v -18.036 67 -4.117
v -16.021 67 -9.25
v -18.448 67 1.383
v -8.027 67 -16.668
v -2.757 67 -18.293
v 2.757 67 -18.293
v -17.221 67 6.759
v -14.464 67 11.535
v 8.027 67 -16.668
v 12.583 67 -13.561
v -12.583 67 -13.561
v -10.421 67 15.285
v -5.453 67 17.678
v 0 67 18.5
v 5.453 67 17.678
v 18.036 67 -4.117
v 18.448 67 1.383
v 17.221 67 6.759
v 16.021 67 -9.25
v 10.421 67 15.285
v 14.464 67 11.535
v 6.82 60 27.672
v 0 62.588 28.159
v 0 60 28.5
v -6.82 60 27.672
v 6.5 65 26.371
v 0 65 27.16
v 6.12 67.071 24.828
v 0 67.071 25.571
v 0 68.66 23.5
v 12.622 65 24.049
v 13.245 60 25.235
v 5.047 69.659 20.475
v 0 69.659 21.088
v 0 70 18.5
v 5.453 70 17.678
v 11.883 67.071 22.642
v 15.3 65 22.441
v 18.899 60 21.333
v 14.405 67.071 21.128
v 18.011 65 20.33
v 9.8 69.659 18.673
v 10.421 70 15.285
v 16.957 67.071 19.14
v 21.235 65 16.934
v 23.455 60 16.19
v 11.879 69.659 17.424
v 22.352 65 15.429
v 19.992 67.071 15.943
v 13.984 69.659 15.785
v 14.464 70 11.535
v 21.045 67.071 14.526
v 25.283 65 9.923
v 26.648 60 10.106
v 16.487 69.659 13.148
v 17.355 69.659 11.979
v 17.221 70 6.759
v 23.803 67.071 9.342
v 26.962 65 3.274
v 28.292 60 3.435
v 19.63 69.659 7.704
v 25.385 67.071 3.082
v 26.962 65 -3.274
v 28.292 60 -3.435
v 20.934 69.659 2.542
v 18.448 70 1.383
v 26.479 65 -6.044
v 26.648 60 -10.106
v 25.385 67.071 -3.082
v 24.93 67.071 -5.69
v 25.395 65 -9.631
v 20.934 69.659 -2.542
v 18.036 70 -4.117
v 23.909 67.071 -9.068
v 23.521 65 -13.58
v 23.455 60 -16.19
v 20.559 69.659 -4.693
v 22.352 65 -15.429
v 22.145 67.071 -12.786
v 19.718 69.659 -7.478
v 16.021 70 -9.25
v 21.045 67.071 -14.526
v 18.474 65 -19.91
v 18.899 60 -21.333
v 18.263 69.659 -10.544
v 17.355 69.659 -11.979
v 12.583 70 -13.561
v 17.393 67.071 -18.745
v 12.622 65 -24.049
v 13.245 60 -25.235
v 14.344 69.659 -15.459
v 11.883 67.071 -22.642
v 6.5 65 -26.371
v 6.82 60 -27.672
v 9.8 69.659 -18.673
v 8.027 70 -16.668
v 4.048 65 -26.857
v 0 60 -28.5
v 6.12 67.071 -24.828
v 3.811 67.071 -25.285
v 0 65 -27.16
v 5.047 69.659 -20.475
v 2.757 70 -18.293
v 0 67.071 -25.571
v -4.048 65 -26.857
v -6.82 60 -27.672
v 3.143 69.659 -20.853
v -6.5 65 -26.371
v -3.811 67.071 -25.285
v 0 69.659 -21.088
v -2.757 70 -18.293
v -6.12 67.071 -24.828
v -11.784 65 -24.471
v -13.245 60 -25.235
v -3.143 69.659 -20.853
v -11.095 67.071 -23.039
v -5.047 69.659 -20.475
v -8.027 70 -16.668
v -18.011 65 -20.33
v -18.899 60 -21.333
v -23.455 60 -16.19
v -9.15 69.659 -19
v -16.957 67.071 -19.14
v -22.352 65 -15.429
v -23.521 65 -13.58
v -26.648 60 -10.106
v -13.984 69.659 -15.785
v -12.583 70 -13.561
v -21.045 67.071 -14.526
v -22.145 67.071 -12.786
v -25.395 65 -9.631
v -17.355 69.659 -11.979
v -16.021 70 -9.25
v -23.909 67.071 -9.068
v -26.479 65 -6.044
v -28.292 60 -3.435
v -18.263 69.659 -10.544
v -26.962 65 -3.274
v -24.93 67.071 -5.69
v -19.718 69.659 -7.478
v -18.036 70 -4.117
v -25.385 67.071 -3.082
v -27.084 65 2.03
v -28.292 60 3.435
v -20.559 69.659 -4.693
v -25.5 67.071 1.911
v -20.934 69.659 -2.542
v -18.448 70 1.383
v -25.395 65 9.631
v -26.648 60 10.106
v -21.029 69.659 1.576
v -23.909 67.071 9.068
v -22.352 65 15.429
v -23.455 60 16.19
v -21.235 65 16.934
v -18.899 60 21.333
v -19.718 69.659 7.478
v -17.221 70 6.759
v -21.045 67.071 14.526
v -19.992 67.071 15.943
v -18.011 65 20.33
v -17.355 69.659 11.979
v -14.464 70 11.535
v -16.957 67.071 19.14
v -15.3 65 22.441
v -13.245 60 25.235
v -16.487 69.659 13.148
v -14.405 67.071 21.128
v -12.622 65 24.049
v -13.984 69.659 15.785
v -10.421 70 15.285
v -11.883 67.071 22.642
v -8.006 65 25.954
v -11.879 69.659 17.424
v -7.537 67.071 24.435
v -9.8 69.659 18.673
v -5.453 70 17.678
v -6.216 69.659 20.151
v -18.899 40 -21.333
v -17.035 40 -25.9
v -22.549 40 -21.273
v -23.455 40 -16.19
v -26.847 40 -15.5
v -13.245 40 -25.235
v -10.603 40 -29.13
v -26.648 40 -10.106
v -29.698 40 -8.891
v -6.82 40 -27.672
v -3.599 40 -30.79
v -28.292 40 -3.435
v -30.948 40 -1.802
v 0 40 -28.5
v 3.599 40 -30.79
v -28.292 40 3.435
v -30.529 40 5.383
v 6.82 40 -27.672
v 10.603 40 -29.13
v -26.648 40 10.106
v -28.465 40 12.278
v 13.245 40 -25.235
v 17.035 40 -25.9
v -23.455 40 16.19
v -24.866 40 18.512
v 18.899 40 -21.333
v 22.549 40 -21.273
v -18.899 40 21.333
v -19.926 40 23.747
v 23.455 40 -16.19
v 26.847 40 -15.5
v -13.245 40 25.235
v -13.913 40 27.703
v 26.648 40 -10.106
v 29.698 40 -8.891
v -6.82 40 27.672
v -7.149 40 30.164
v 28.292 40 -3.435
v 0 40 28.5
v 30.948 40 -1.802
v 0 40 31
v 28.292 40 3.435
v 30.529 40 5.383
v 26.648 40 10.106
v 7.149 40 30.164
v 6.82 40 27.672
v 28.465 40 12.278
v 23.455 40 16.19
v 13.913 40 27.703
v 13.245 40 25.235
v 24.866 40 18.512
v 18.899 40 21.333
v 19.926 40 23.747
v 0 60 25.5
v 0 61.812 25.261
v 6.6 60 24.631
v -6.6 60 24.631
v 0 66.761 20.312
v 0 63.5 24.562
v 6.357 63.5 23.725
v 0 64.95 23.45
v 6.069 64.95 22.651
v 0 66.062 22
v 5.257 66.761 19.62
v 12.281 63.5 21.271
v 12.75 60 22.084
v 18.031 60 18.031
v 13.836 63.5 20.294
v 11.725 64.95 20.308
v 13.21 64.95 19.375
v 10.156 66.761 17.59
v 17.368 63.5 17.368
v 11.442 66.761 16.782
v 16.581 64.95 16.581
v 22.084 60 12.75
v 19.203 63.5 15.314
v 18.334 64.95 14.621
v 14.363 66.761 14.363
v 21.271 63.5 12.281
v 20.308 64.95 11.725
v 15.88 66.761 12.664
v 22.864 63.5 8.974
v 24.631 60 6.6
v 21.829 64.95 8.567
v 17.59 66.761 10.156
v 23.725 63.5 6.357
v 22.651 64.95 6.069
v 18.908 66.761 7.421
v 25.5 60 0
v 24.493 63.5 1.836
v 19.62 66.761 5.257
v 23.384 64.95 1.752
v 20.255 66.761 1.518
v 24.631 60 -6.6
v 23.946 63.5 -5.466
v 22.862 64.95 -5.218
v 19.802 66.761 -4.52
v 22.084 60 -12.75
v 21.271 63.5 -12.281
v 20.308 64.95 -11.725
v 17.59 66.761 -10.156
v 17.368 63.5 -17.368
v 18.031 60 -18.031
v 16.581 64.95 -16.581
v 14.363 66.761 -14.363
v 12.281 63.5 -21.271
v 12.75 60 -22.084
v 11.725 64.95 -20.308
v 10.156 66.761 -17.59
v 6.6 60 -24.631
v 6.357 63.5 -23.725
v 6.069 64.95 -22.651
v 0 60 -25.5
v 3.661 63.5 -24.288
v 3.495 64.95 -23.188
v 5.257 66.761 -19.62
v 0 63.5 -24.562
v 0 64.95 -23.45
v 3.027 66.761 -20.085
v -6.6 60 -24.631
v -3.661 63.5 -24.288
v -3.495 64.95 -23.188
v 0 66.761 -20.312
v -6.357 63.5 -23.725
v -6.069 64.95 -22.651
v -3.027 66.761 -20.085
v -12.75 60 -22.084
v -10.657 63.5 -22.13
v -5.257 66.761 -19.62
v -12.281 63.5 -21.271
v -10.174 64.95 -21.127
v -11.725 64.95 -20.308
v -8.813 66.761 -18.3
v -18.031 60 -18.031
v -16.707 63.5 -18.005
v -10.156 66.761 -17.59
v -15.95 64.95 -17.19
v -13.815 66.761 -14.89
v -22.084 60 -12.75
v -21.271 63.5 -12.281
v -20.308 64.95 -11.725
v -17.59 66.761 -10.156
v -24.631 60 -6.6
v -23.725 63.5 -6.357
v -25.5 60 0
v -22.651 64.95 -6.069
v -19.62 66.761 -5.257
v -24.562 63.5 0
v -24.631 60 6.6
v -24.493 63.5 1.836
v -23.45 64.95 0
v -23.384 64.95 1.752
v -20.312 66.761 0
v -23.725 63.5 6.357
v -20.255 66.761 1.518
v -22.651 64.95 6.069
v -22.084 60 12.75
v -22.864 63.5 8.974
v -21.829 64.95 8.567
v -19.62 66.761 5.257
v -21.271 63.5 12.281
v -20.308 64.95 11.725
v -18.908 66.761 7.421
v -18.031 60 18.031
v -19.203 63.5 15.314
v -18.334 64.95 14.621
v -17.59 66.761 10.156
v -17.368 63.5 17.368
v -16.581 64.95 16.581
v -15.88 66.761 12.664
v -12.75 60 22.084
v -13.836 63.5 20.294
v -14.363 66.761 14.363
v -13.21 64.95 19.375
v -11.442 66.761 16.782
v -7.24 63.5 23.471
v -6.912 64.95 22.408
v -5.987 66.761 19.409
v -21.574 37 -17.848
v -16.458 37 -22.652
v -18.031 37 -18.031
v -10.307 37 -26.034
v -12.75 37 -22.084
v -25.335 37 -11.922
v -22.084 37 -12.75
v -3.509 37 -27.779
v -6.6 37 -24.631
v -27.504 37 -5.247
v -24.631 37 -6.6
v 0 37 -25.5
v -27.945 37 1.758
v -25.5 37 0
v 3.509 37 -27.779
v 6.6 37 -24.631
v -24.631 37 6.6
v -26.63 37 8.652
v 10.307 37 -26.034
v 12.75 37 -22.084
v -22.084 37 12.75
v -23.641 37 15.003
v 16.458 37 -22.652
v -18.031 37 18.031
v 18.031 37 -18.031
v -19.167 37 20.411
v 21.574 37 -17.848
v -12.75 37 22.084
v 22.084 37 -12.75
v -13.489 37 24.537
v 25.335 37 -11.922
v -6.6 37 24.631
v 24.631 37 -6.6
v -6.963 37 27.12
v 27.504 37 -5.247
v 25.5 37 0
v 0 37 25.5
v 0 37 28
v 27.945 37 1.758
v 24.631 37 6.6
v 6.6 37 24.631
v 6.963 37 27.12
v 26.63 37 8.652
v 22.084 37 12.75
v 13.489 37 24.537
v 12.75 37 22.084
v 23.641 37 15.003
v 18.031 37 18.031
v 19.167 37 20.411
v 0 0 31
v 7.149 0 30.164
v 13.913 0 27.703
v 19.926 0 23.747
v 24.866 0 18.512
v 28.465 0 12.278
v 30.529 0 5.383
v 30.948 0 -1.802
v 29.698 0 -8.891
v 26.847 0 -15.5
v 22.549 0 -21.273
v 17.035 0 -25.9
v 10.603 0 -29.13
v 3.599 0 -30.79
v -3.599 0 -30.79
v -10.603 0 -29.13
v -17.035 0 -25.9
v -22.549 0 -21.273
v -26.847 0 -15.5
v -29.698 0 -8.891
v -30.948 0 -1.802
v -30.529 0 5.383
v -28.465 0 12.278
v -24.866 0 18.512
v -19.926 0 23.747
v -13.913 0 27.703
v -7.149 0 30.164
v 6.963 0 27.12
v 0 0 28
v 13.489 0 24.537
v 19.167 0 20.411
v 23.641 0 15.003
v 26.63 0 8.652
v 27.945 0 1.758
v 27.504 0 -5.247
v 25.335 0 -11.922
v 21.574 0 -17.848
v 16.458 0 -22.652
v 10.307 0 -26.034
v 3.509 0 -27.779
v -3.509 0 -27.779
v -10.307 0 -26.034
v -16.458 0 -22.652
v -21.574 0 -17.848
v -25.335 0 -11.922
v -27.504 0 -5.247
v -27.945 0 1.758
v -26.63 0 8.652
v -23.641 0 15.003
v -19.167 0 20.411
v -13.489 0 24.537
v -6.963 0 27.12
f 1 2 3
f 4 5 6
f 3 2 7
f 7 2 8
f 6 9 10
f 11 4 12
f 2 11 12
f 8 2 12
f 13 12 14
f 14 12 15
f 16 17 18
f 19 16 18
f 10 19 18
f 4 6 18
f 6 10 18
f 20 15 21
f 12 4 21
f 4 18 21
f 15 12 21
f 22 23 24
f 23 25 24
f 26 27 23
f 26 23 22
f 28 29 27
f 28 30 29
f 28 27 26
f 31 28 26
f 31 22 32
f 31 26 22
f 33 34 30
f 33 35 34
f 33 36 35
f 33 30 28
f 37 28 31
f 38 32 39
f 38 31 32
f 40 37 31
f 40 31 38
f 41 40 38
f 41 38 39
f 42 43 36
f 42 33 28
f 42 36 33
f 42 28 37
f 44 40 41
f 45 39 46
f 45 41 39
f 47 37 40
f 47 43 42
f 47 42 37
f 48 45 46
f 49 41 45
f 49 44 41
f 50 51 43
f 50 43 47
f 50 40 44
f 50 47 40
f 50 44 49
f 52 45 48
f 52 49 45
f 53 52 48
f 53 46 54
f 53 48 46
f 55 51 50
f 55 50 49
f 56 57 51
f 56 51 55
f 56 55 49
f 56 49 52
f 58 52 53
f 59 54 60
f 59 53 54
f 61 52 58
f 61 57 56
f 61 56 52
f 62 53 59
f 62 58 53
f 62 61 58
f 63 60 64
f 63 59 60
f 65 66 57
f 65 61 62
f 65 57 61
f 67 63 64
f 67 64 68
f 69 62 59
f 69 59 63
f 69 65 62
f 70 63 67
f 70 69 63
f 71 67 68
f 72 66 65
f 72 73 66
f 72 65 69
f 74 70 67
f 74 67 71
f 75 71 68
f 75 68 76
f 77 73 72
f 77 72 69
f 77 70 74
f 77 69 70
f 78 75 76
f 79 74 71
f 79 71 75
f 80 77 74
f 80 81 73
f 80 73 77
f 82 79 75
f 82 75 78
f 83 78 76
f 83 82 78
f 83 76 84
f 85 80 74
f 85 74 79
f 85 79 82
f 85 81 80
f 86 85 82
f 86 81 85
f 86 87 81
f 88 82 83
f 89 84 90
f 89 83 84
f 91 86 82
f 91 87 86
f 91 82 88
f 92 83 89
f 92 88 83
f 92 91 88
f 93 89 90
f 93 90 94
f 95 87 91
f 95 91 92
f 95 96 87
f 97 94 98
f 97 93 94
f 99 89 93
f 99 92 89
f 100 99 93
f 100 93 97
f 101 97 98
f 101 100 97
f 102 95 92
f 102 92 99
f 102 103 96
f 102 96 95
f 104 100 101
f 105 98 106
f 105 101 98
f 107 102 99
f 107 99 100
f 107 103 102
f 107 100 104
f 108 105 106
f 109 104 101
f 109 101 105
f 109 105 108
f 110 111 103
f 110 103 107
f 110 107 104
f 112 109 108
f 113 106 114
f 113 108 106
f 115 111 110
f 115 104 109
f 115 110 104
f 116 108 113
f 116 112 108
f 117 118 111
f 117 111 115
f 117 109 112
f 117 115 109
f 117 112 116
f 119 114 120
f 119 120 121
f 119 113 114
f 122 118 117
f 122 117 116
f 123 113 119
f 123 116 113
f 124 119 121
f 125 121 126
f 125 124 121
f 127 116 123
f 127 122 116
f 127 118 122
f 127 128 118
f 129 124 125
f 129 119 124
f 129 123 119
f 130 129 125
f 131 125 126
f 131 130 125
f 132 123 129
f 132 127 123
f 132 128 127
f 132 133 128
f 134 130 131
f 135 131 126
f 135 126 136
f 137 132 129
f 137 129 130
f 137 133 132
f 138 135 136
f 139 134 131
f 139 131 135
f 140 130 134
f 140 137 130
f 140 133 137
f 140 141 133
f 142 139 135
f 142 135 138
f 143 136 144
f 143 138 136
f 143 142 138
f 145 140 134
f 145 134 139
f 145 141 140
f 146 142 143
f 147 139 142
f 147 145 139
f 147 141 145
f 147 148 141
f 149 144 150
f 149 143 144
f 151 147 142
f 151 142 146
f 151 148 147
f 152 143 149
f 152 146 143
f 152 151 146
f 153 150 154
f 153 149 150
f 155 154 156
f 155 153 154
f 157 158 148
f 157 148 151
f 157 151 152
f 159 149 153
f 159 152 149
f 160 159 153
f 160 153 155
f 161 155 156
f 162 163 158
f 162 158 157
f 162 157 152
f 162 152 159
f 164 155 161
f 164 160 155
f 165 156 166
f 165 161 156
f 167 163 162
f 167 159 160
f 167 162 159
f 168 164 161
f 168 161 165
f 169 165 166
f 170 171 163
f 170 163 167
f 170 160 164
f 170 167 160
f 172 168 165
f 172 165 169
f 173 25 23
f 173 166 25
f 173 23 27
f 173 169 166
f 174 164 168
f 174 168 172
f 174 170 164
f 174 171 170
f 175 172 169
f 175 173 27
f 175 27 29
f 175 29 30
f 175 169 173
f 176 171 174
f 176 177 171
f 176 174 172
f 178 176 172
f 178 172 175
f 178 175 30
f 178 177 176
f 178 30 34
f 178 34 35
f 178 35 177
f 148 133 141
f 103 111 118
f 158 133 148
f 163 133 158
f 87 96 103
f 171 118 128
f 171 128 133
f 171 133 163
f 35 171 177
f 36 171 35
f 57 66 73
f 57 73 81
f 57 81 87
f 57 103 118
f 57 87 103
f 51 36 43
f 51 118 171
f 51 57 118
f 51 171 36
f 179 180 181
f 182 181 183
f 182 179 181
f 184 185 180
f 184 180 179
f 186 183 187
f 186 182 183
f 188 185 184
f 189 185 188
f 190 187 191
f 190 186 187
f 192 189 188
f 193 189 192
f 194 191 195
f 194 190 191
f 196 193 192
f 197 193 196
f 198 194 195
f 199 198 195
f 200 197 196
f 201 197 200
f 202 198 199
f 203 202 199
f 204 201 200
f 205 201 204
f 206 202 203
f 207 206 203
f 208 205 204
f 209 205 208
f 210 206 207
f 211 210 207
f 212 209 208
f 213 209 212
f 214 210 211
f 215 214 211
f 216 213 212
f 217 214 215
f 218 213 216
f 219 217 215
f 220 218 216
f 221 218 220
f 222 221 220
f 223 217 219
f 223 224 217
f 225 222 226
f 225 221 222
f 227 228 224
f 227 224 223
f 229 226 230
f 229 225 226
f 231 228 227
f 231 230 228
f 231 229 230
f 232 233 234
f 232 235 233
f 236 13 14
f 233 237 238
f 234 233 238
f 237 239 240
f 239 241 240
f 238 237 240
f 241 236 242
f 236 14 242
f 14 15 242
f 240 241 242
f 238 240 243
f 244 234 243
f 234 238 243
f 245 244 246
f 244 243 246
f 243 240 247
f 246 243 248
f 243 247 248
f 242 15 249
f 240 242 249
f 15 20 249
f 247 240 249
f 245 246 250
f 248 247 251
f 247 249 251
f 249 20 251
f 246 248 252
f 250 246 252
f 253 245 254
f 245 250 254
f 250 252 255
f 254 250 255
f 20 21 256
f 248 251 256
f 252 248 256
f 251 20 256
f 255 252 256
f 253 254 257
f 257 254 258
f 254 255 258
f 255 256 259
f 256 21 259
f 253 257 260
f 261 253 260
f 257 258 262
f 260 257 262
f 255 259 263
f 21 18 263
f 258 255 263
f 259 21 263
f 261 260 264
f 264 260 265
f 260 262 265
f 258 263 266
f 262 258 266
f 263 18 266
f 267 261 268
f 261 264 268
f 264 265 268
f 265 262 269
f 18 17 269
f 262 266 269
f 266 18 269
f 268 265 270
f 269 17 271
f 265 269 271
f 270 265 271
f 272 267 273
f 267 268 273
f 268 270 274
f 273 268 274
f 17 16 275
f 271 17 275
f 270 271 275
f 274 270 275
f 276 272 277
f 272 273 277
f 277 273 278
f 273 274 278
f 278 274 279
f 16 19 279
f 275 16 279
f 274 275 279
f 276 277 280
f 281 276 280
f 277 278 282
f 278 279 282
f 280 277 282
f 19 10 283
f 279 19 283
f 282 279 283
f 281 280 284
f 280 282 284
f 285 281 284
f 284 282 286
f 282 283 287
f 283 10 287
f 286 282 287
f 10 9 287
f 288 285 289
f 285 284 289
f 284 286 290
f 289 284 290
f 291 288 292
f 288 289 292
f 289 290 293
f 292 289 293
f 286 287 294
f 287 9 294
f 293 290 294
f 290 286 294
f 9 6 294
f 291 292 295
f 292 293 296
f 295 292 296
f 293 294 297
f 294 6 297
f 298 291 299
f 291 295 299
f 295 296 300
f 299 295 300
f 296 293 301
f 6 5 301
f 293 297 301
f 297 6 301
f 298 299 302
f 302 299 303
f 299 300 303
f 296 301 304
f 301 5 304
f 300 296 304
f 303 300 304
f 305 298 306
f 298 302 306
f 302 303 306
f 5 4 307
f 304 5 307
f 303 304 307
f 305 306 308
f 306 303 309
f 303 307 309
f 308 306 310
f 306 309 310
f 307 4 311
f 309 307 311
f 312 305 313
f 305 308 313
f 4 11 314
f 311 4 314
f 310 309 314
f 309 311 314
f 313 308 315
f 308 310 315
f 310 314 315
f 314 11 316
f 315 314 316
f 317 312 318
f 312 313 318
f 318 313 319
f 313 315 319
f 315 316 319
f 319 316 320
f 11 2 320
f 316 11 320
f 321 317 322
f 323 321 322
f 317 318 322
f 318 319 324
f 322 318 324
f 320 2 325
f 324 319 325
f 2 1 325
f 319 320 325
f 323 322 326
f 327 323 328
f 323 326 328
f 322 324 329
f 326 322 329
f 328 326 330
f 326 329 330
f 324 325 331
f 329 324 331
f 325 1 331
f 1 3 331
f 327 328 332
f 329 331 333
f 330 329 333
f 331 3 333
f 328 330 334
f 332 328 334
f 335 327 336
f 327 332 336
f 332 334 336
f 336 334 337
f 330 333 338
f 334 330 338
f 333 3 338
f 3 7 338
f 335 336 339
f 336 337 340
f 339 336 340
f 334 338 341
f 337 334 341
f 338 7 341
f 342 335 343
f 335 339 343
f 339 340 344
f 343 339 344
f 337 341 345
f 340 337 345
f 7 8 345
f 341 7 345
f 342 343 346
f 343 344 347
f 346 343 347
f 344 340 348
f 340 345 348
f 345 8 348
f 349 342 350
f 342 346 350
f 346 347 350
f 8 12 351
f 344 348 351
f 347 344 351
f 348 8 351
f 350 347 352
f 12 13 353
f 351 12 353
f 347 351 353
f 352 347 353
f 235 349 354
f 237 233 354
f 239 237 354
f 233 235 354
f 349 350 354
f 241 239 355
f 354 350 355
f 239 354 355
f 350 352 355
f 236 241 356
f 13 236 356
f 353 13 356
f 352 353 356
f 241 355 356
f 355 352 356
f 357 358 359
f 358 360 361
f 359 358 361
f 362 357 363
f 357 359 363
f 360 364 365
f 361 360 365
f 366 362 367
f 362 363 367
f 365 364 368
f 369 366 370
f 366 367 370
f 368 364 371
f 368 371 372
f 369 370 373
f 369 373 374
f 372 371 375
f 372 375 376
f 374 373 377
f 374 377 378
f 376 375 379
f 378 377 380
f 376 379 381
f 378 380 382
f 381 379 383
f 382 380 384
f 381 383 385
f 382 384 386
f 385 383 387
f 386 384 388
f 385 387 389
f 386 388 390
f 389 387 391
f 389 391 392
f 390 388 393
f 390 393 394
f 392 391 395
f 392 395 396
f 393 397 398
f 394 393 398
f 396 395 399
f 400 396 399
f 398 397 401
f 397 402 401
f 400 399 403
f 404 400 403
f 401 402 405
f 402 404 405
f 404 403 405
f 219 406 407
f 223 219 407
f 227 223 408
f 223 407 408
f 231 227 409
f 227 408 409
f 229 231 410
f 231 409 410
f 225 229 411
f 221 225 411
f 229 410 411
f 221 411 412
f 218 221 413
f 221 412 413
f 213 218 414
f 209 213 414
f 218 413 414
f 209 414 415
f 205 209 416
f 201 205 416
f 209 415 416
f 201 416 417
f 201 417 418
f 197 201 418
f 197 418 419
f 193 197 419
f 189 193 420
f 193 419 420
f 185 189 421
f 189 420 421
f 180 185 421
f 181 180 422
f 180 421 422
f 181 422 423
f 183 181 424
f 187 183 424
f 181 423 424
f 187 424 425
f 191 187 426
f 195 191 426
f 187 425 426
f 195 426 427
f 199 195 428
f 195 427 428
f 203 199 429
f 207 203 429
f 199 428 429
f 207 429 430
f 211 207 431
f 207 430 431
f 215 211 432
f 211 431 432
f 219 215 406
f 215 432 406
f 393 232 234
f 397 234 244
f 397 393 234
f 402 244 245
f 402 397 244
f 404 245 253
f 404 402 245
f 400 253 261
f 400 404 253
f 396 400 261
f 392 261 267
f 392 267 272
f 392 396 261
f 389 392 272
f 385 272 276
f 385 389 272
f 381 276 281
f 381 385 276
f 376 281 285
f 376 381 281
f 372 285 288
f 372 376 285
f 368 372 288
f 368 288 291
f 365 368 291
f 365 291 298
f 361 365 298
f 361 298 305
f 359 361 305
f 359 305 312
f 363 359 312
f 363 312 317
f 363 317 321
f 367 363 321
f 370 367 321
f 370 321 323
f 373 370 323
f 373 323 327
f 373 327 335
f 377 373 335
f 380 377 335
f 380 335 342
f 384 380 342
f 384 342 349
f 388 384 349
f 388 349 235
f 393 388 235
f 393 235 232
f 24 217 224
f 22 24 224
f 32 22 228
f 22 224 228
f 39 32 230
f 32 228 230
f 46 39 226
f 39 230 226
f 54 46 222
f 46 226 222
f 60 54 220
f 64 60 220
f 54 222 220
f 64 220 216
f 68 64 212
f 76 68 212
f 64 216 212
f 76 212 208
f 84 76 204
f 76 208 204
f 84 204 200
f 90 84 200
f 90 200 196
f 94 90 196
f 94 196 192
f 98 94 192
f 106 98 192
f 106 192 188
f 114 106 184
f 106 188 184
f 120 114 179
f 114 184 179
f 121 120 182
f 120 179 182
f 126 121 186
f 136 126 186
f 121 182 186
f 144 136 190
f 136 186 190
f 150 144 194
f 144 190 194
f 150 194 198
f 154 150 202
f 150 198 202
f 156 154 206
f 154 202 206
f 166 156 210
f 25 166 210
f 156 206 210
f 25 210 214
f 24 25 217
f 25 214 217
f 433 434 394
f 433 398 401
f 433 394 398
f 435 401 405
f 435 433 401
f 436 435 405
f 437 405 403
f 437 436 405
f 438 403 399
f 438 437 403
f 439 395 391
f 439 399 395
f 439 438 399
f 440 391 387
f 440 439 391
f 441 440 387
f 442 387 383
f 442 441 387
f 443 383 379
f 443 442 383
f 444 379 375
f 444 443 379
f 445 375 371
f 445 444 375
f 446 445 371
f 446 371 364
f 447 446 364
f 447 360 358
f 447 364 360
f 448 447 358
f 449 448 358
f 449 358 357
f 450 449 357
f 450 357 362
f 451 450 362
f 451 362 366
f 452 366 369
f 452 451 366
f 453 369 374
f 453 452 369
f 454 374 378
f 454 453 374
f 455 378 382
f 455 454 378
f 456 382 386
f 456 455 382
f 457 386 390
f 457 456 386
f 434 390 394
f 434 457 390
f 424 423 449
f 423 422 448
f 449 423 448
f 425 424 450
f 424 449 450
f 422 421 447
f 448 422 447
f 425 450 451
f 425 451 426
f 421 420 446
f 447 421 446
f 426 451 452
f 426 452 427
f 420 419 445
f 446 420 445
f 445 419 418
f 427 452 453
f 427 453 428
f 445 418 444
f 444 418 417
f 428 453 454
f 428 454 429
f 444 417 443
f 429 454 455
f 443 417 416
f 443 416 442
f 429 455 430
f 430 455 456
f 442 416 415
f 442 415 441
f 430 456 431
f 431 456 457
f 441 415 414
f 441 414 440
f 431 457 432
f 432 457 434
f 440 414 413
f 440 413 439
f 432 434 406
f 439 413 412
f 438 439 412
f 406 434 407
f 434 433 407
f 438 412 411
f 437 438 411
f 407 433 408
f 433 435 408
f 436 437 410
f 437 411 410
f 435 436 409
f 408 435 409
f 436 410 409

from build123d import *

# Parameters (mm, degrees)
SKETCH_1_R      = 31
EXTRUDE_1_DEPTH = 40
SKETCH_2_R      = 28.5
EXTRUDE_2_DEPTH = 30
FILLET_1_R      = 10
SHELL_1_T       = -3


with BuildPart() as part:
    # 스케치1 → 보스-돌출1 (new body)
    with BuildSketch(Plane(origin=(0, 0, 0), x_dir=(1, 0, 0), z_dir=(0, 1, 0))):
        with Locations(Location((0, 0, 0), (0, 0, 270))):
            Circle(SKETCH_1_R)
    extrude(amount=EXTRUDE_1_DEPTH)

    # 스케치2 → 보스-돌출2 (add)
    with BuildSketch(Plane(origin=(0, 40, 0), x_dir=(1, 0, 0), z_dir=(0, 1, 0))):
        with Locations(Location((0, 0, 0), (0, 0, 270))):
            Circle(SKETCH_2_R)
    extrude(amount=EXTRUDE_2_DEPTH)

    # 필렛1
    fillet_1_edges = [part.edges().sort_by_distance(p)[0] for p in [
        (0, 70, -28.5),
    ]]
    fillet(fillet_1_edges, radius=FILLET_1_R)

    # 쉘1
    shell_1_openings = [part.faces().sort_by_distance(p)[0] for p in [
        (0, 0, 0),
    ]]
    offset(amount=SHELL_1_T, openings=shell_1_openings, kind=Kind.INTERSECTION)


solid = part.part
